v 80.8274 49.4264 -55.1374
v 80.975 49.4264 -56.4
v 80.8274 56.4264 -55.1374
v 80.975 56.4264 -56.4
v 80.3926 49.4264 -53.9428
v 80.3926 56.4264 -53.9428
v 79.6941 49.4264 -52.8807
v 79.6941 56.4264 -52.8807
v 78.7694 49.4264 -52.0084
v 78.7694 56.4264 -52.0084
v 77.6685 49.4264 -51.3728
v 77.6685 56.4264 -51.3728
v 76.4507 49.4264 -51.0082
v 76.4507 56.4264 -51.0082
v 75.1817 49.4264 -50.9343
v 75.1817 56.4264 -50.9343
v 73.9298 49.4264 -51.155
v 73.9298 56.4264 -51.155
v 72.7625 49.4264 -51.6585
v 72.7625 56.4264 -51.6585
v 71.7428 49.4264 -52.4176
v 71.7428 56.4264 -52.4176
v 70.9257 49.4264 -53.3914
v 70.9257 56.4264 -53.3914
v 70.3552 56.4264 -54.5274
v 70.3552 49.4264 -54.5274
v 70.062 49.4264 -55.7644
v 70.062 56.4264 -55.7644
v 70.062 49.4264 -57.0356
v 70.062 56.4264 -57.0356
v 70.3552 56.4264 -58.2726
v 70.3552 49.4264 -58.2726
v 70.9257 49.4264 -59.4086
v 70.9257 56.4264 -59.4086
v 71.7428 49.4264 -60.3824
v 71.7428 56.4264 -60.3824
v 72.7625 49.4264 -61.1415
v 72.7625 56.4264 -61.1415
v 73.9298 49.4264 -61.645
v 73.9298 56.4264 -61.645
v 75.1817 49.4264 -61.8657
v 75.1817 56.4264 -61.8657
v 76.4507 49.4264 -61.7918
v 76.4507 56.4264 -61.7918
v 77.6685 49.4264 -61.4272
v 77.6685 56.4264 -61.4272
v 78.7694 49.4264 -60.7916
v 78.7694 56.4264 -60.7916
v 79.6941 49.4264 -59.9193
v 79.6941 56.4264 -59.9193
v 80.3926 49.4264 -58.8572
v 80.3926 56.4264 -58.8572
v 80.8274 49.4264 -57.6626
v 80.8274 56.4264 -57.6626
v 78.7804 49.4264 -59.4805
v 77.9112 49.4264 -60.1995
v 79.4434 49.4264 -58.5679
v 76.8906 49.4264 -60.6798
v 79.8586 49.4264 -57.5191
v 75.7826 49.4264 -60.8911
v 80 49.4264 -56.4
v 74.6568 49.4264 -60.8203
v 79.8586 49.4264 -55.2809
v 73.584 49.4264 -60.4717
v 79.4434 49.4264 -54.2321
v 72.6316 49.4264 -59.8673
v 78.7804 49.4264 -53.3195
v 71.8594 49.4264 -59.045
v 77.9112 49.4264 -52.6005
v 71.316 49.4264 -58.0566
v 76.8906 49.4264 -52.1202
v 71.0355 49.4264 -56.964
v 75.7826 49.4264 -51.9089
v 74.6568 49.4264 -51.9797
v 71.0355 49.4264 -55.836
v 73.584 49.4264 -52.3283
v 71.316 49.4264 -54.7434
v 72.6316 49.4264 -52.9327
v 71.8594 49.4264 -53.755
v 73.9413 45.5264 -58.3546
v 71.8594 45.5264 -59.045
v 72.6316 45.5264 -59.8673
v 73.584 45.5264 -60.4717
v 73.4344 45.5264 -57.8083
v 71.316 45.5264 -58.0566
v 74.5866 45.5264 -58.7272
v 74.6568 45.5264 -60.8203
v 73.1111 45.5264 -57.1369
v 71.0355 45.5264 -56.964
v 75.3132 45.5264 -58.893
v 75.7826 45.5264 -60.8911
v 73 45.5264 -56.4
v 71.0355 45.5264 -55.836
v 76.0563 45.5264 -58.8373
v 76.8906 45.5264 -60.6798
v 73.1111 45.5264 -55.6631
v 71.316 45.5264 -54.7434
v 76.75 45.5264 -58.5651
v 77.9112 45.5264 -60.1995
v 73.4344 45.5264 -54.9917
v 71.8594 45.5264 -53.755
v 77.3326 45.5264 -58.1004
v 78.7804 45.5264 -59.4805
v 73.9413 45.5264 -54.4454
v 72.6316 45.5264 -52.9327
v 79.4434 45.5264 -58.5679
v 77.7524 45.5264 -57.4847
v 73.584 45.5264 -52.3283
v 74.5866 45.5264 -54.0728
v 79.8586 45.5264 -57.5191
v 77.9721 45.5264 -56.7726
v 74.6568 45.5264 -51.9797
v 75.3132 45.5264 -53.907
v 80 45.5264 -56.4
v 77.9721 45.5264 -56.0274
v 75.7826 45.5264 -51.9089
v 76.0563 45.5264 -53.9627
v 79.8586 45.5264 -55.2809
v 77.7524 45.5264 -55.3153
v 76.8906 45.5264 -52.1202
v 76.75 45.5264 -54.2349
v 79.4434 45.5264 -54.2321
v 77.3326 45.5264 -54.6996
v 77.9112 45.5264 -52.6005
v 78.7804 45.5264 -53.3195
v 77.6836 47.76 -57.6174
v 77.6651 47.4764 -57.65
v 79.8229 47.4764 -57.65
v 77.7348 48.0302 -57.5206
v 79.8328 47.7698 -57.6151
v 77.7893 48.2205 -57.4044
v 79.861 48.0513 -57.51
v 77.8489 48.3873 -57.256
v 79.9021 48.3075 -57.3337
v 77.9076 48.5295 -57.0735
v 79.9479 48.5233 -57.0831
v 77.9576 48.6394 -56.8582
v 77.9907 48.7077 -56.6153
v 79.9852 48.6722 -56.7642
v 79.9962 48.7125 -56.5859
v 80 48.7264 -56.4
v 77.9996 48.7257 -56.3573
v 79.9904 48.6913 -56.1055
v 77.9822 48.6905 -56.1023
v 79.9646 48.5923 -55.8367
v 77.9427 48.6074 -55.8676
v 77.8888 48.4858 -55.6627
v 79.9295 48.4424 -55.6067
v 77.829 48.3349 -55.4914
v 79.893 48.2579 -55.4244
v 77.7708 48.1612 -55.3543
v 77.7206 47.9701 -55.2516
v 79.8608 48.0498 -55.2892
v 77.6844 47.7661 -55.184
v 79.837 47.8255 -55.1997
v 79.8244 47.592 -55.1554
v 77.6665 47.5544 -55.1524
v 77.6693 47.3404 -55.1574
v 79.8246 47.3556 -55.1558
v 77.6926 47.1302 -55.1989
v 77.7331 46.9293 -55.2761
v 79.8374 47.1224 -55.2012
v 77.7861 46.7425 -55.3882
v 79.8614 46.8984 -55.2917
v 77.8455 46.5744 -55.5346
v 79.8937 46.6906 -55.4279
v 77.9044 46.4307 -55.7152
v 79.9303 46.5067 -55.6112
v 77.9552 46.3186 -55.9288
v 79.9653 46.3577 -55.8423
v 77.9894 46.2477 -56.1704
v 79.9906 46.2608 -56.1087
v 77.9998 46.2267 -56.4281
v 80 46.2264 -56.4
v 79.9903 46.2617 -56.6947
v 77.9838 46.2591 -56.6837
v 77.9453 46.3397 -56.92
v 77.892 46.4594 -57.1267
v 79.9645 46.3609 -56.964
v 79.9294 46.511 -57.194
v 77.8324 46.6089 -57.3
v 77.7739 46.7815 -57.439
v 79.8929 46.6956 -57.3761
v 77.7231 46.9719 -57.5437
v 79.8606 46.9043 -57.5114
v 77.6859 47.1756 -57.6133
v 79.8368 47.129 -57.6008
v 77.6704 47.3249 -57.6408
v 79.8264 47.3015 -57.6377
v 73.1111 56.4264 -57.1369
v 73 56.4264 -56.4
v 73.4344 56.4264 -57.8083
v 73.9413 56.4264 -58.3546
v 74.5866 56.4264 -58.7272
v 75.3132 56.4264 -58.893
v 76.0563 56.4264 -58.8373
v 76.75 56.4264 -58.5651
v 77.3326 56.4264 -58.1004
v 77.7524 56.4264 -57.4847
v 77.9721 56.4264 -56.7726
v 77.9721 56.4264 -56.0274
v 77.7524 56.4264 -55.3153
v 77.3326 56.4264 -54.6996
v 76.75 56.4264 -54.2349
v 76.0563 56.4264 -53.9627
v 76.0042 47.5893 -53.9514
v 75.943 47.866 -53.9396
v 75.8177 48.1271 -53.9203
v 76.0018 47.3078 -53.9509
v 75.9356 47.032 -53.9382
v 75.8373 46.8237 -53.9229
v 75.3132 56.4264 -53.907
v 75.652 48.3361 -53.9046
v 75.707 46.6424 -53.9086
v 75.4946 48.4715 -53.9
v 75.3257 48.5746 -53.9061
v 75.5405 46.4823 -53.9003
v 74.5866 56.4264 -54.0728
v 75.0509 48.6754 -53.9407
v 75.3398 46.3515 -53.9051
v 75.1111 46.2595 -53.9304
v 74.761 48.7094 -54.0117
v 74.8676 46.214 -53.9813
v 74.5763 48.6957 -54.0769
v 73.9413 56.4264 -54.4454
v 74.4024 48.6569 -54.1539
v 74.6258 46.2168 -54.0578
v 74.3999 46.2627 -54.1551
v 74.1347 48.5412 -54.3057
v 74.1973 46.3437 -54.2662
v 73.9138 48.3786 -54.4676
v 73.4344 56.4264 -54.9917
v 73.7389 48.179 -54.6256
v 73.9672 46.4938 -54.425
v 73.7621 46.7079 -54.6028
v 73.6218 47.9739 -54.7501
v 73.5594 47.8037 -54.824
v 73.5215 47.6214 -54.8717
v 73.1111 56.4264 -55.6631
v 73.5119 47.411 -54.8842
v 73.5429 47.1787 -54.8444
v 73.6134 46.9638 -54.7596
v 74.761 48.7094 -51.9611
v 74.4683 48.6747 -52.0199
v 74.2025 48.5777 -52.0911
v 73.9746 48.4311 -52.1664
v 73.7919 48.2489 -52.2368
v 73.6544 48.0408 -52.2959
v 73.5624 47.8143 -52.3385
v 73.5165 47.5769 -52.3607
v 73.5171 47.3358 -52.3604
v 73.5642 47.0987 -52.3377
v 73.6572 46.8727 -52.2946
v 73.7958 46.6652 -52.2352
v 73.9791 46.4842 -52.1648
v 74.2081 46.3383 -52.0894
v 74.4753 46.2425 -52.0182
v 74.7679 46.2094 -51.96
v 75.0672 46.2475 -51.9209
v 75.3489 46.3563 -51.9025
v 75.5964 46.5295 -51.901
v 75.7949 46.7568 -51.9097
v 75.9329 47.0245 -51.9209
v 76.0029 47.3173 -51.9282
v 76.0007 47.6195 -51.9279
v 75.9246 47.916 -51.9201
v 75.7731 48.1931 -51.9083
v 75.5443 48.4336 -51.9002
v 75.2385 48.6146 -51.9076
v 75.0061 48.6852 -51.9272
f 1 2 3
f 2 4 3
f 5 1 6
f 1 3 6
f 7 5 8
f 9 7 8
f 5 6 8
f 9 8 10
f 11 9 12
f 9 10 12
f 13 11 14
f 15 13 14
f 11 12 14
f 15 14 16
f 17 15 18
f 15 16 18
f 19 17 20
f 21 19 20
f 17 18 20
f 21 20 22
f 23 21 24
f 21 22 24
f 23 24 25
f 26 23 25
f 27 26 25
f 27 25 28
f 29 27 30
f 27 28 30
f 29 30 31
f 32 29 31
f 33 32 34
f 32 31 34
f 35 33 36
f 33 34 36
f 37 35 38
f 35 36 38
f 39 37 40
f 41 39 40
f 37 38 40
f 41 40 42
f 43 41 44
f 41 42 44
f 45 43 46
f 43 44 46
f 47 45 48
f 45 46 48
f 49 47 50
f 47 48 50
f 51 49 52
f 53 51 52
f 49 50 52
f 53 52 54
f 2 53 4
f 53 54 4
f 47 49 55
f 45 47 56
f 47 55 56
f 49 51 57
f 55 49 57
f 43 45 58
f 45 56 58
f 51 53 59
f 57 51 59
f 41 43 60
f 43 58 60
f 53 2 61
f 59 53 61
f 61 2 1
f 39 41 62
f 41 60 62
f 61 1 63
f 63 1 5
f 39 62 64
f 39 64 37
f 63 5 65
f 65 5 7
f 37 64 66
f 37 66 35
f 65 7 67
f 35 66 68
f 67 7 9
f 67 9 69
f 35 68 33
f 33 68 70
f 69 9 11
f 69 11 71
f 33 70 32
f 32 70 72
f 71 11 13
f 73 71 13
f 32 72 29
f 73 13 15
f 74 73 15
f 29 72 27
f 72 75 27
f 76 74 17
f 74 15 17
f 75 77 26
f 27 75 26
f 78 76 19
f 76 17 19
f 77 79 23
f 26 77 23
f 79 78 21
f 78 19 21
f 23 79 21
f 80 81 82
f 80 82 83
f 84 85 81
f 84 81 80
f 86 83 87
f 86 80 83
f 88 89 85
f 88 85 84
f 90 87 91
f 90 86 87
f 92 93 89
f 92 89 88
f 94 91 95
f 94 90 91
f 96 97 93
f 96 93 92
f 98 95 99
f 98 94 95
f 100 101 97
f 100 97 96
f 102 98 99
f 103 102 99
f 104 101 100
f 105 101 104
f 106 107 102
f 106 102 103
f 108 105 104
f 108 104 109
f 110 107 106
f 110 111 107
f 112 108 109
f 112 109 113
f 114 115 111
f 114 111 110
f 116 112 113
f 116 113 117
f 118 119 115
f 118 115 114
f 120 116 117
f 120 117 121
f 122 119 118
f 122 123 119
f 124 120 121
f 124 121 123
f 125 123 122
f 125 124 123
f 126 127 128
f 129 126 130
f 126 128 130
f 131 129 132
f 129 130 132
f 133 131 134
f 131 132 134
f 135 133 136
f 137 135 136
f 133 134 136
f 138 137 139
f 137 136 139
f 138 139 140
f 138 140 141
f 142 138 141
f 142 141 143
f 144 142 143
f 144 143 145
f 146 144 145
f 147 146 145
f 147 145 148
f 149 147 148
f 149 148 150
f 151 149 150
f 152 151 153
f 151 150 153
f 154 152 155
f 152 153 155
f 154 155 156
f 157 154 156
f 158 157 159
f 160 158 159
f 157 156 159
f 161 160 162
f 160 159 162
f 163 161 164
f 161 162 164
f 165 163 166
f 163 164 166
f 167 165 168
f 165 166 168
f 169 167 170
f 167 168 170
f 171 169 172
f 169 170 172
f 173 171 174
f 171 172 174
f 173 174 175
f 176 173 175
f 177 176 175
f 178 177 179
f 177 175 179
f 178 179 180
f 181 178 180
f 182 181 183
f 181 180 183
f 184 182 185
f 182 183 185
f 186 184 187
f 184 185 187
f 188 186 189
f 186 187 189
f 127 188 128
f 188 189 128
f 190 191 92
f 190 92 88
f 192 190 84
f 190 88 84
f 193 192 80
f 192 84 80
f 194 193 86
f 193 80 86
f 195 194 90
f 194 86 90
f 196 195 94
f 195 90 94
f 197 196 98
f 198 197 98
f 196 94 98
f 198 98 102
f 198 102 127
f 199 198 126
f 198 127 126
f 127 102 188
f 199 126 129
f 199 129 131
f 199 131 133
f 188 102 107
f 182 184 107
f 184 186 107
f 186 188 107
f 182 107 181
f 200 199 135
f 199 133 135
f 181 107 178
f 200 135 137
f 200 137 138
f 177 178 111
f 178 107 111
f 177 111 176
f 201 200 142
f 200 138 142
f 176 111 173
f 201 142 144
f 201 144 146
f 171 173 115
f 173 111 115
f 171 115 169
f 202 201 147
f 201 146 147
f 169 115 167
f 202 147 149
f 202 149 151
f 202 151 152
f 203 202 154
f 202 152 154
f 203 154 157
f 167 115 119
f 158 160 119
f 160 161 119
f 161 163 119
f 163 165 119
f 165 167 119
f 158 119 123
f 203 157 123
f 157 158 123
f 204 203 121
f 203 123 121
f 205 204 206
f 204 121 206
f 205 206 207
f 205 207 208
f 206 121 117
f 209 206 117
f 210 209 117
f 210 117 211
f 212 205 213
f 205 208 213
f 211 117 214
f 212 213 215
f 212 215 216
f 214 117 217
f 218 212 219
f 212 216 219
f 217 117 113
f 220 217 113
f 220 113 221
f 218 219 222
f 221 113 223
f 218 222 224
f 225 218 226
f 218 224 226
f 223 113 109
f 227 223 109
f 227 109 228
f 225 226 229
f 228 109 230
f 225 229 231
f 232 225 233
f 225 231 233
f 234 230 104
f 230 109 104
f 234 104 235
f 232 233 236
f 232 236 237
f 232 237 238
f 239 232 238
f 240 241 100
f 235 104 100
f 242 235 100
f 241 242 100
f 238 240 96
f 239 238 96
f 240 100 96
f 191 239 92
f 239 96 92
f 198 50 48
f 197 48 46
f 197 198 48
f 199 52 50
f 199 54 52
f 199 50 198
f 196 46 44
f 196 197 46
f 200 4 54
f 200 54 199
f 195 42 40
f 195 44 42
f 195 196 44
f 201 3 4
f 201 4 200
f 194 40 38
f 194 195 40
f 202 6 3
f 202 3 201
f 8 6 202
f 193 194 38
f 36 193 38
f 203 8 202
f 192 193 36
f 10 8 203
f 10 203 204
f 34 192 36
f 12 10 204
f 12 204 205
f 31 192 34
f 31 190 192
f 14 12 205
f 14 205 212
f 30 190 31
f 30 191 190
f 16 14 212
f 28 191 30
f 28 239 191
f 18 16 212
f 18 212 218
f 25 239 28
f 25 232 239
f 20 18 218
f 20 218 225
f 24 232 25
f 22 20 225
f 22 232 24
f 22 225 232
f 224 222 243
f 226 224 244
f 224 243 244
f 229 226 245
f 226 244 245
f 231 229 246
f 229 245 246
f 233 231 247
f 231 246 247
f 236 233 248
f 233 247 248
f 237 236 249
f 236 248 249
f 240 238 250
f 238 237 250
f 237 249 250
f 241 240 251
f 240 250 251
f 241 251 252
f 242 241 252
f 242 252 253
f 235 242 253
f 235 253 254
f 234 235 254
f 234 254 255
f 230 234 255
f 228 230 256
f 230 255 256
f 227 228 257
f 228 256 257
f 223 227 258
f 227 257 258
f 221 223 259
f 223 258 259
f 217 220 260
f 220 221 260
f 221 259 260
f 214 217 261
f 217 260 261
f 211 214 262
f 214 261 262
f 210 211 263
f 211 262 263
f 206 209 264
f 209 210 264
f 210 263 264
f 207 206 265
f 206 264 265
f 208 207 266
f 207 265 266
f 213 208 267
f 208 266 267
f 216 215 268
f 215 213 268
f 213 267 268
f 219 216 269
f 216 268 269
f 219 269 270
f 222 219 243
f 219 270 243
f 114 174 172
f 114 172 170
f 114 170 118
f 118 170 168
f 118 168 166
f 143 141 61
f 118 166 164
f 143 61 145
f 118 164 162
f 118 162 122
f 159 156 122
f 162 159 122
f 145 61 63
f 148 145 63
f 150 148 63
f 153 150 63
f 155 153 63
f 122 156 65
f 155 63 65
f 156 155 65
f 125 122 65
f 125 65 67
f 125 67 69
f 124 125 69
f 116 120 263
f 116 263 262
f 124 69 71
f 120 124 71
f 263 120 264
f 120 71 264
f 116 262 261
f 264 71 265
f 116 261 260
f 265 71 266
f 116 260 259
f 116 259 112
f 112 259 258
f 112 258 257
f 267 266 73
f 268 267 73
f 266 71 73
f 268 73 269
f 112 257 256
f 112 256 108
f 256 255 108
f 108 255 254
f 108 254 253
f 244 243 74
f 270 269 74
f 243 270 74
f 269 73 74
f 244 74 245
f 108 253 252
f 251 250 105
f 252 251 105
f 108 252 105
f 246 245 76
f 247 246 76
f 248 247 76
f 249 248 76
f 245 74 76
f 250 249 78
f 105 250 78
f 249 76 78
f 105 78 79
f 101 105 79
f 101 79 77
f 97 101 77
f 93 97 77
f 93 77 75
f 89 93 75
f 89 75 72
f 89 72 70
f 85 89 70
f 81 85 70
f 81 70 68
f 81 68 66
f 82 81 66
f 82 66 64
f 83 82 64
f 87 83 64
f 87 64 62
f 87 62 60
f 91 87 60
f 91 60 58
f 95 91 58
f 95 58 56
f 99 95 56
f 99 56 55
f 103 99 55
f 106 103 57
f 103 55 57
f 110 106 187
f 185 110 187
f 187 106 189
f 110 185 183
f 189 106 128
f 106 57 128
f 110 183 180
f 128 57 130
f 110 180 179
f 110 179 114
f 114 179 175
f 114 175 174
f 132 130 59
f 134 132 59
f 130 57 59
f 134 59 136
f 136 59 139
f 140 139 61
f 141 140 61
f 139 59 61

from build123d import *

# Parameters (mm, degrees)
SKETCH1_W                      = 5.475
SKETCH1_H                      = 7
SKETCH2_R                      = 4.5
BOSS_EXTRUDE1_DEPTH            = 3.9
F_5_0_5_DIAMETER_HOLE1_D       = 5
F_5_0_5_DIAMETER_HOLE1_DEPTH   = 10.9
F_2_5_2_5_DIAMETER_HOLE1_D     = 2.5
F_2_5_2_5_DIAMETER_HOLE1_DEPTH = 3.309936491
SKETCH7_W                      = 1.25
SKETCH7_H                      = 3.960443852


with BuildPart() as part:
    # Sketch1 → Revolve1 (revolve)
    with BuildSketch(Plane.XY.offset(-56.4)):
        with Locations((78.2375, 52.926431985)):
            Rectangle(SKETCH1_W, SKETCH1_H)
    revolve(axis=Axis((75.5, 56.426431985, -56.4), (0, -1, 0)))

    # Sketch2 → Boss-Extrude1 (add)
    with BuildSketch(Plane.XZ.offset(-49.426431985)):
        with Locations((75.5, -56.4)):
            Circle(SKETCH2_R)
    extrude(amount=BOSS_EXTRUDE1_DEPTH)

    # Ø5.0 (5) Diameter Hole1
    with Locations(Plane(origin=(0, 56.426431985, 0), x_dir=(1, 0, 0), z_dir=(0, 1, 0))):
        with Locations((75.5, 56.4)):
            Hole(F_5_0_5_DIAMETER_HOLE1_D / 2, depth=F_5_0_5_DIAMETER_HOLE1_DEPTH)

    # Ø2.5 (2.5) Diameter Hole1
    with Locations(Plane.ZY.offset(-77.665063509)):
        with Locations((-56.4, 47.476431985)):
            Hole(F_2_5_2_5_DIAMETER_HOLE1_D / 2, depth=F_2_5_2_5_DIAMETER_HOLE1_DEPTH)

    # Sketch7 → Ø2.5 (2.5) Diameter Hole2 (revolve, cut)
    with BuildSketch(Plane(origin=(74.761000333, 47.459423849, -54.885443852), x_dir=(0, 1, 0), z_dir=(1, 0, 0))):
        with Locations((0.625, 1.980221926)):
            Rectangle(SKETCH7_W, SKETCH7_H)
    revolve(axis=Axis((74.761000333, 47.459423849, -61.235443852), (0, 0, 1)), mode=Mode.SUBTRACT)


solid = part.part
